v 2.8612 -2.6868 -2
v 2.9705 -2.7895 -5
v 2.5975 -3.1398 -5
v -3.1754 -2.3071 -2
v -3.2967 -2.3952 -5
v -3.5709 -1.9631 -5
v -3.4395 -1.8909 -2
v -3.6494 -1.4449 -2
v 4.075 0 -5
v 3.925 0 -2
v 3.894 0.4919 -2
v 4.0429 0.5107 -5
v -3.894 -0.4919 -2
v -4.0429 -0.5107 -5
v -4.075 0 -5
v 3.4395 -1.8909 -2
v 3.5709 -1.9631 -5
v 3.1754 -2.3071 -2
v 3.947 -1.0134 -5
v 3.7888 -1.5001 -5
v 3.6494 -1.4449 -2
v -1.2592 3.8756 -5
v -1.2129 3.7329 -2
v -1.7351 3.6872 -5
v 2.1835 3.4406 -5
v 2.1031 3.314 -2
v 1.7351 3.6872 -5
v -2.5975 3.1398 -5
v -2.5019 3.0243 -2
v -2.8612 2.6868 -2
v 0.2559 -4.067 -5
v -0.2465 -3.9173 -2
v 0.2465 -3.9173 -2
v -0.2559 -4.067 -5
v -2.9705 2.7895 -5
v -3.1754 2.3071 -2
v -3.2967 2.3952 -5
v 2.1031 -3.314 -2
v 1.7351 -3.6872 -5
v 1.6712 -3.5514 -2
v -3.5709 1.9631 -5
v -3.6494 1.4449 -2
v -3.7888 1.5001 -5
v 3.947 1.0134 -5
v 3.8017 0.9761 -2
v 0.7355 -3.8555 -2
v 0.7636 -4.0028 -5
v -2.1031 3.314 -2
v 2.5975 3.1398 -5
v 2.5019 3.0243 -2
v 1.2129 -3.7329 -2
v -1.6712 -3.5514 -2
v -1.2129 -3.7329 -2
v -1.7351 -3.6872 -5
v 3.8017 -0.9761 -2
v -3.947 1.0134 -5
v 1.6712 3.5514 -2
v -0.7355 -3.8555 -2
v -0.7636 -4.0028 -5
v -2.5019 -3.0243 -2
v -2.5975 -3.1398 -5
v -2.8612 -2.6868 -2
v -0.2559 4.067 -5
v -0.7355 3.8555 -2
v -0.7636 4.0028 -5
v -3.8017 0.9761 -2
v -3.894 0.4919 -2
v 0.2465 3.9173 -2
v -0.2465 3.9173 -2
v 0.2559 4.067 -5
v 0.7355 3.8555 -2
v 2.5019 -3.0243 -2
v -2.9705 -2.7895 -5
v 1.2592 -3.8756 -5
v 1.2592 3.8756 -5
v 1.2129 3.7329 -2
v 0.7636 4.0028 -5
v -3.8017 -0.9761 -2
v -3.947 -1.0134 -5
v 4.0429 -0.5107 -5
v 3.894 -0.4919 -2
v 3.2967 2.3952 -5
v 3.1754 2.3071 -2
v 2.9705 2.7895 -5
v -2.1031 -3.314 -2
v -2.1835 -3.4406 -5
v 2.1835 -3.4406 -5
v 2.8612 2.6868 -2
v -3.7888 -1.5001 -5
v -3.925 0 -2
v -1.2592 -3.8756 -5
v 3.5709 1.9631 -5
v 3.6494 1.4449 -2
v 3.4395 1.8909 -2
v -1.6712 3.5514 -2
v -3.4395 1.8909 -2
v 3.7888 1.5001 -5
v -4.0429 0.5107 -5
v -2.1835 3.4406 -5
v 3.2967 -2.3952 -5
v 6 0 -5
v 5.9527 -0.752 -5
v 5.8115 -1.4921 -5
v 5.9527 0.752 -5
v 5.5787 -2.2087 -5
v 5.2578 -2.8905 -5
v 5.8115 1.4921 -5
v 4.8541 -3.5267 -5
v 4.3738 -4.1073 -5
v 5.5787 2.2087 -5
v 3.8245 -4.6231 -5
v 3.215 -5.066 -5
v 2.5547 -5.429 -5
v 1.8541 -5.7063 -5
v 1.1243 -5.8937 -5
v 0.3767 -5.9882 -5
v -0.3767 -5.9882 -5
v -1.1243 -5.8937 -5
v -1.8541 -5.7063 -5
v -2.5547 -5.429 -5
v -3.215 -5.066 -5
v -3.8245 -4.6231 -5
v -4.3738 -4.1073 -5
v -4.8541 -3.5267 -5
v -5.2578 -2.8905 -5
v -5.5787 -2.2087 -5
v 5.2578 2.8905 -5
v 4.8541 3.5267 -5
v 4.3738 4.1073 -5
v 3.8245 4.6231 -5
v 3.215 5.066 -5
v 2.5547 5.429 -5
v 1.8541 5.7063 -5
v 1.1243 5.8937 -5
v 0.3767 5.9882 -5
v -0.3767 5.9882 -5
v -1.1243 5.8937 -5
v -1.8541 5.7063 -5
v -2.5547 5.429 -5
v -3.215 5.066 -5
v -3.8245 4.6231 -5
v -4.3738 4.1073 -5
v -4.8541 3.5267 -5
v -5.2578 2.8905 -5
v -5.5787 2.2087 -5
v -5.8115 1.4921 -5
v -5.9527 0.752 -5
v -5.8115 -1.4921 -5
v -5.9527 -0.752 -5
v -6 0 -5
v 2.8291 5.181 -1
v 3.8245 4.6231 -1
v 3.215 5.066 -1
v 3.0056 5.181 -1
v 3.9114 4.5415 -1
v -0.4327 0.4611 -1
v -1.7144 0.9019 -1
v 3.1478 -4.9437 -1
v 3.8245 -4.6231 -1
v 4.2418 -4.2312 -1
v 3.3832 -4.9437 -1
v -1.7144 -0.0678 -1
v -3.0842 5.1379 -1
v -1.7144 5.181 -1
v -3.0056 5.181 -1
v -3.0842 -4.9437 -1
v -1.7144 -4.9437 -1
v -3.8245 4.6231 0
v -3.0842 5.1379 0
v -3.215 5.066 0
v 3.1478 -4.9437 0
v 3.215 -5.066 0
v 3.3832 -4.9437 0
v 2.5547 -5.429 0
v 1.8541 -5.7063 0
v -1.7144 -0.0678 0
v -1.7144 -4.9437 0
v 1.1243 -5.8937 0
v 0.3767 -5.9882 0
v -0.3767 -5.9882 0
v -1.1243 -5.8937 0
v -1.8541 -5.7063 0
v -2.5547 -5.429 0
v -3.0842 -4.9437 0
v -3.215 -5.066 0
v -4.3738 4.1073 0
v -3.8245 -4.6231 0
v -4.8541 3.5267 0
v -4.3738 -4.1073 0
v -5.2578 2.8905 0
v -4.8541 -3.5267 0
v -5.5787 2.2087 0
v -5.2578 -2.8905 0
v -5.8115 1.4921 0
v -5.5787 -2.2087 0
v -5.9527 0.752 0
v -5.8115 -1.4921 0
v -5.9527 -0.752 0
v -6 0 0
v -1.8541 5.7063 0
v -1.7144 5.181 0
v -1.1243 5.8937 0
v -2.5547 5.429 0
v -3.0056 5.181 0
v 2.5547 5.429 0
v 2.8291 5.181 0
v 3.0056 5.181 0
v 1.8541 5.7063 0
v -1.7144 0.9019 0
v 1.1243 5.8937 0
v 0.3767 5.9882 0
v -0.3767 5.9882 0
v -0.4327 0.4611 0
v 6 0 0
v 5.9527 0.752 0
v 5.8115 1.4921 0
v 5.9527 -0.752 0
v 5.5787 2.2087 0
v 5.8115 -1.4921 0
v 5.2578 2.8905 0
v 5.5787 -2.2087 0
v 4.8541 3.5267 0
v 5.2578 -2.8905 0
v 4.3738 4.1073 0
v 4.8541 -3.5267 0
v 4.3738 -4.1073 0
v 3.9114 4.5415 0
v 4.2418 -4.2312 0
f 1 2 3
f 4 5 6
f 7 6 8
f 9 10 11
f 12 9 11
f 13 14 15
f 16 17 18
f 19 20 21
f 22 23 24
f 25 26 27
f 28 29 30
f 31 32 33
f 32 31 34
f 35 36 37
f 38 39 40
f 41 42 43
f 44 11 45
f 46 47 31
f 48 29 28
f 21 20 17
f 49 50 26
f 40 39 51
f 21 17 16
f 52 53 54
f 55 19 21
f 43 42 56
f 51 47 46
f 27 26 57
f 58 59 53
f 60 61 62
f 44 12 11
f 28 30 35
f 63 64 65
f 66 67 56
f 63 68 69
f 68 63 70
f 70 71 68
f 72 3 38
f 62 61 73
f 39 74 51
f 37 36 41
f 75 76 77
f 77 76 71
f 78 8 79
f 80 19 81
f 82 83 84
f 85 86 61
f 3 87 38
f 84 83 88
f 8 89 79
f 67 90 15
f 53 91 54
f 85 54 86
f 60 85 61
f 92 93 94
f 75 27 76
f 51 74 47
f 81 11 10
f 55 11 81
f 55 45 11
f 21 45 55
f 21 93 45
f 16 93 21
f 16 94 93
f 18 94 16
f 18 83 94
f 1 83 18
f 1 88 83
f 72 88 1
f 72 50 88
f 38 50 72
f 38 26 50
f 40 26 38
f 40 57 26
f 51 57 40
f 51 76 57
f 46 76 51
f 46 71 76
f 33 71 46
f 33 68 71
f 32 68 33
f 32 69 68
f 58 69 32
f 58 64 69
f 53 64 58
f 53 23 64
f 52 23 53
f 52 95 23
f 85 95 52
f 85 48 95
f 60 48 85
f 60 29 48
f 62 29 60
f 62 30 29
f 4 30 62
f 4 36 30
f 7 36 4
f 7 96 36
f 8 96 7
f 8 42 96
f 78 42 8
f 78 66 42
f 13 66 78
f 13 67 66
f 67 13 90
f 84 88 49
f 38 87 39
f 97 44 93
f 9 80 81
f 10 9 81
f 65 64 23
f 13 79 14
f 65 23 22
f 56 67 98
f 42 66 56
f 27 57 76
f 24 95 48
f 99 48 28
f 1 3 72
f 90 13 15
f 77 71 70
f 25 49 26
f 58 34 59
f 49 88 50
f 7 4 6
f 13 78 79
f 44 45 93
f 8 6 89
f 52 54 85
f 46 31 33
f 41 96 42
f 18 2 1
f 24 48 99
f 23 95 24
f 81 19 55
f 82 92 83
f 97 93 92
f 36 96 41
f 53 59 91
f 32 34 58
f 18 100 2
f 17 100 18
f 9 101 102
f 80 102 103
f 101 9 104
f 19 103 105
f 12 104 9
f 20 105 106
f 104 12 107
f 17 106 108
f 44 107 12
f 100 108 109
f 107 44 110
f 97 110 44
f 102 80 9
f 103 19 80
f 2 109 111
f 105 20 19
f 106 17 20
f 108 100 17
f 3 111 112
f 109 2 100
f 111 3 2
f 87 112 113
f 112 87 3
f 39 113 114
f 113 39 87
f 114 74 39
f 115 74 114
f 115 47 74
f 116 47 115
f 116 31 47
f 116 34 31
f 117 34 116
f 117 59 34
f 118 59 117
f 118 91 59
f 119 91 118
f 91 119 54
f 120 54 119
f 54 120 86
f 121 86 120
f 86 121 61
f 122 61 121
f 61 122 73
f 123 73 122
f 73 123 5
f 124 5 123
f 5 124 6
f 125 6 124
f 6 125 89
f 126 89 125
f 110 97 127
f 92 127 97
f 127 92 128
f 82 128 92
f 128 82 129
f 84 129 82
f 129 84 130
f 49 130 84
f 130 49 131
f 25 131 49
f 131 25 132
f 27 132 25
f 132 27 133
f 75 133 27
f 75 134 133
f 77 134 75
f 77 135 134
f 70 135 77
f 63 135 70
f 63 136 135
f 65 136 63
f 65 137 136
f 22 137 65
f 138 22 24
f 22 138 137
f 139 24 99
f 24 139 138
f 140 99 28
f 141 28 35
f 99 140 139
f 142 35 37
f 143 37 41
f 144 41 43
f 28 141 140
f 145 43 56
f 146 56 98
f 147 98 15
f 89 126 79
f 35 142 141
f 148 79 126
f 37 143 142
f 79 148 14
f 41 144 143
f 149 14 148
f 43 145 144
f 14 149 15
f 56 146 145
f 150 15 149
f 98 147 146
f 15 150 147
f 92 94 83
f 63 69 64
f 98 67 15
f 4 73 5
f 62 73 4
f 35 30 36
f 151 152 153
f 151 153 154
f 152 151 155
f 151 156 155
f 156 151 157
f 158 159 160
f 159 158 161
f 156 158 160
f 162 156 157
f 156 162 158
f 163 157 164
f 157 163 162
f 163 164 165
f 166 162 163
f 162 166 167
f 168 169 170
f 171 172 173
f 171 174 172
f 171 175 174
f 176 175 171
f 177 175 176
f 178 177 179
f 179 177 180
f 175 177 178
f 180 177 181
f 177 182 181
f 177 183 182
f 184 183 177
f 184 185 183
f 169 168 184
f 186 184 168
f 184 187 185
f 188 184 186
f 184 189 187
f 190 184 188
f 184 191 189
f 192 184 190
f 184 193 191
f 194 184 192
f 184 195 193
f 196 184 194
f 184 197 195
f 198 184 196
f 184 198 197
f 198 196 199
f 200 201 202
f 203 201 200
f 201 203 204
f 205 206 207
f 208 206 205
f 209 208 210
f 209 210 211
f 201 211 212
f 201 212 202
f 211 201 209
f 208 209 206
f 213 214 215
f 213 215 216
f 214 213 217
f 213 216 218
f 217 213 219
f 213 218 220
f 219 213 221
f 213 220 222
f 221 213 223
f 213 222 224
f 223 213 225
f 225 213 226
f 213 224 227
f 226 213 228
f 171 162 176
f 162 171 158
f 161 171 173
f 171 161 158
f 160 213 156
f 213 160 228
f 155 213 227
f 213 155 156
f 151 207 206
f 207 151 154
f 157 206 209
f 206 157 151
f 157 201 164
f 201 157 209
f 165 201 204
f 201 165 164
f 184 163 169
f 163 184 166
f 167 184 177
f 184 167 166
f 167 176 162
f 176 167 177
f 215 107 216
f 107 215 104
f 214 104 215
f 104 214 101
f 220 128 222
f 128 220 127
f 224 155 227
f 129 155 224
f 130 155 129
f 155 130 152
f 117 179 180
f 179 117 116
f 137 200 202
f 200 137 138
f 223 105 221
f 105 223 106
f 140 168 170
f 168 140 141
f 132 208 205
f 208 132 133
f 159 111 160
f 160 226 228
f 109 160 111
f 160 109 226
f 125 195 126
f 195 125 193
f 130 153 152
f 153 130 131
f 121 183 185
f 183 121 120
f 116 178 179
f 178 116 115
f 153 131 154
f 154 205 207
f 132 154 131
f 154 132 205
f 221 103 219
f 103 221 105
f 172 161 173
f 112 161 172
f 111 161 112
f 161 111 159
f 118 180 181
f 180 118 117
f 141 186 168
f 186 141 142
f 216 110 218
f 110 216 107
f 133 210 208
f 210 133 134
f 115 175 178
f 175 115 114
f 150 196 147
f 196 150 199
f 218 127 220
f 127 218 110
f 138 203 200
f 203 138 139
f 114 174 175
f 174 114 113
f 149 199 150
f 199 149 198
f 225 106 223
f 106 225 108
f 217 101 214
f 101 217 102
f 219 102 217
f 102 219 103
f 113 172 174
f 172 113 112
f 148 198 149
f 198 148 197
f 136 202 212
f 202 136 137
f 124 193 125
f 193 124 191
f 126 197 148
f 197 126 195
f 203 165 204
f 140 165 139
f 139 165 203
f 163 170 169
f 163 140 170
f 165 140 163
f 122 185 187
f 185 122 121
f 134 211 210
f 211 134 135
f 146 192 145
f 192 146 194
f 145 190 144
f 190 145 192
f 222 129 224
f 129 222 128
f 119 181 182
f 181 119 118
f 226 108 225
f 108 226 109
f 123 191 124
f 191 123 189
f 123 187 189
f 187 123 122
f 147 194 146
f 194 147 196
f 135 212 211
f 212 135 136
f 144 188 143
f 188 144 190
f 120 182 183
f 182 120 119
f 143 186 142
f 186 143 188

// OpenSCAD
$fn = 50;

difference() {
	union() {
		translate(v = [0, 0, -5.0]) {
			cylinder(h = 5, r = 6.0);
		}
	}
	union() {
		#translate(v = [0, 0, -5.0]) {
			cylinder(h = 3, r1 = 4.075, r2 = 3.925);
		}
		translate(v = [0, 0, -1]) {
			linear_extrude(height = 1) {
				text(font = "Impact", halign = "center", size = 10, text = "K", valign = "center");
			}
		}
	}
}
